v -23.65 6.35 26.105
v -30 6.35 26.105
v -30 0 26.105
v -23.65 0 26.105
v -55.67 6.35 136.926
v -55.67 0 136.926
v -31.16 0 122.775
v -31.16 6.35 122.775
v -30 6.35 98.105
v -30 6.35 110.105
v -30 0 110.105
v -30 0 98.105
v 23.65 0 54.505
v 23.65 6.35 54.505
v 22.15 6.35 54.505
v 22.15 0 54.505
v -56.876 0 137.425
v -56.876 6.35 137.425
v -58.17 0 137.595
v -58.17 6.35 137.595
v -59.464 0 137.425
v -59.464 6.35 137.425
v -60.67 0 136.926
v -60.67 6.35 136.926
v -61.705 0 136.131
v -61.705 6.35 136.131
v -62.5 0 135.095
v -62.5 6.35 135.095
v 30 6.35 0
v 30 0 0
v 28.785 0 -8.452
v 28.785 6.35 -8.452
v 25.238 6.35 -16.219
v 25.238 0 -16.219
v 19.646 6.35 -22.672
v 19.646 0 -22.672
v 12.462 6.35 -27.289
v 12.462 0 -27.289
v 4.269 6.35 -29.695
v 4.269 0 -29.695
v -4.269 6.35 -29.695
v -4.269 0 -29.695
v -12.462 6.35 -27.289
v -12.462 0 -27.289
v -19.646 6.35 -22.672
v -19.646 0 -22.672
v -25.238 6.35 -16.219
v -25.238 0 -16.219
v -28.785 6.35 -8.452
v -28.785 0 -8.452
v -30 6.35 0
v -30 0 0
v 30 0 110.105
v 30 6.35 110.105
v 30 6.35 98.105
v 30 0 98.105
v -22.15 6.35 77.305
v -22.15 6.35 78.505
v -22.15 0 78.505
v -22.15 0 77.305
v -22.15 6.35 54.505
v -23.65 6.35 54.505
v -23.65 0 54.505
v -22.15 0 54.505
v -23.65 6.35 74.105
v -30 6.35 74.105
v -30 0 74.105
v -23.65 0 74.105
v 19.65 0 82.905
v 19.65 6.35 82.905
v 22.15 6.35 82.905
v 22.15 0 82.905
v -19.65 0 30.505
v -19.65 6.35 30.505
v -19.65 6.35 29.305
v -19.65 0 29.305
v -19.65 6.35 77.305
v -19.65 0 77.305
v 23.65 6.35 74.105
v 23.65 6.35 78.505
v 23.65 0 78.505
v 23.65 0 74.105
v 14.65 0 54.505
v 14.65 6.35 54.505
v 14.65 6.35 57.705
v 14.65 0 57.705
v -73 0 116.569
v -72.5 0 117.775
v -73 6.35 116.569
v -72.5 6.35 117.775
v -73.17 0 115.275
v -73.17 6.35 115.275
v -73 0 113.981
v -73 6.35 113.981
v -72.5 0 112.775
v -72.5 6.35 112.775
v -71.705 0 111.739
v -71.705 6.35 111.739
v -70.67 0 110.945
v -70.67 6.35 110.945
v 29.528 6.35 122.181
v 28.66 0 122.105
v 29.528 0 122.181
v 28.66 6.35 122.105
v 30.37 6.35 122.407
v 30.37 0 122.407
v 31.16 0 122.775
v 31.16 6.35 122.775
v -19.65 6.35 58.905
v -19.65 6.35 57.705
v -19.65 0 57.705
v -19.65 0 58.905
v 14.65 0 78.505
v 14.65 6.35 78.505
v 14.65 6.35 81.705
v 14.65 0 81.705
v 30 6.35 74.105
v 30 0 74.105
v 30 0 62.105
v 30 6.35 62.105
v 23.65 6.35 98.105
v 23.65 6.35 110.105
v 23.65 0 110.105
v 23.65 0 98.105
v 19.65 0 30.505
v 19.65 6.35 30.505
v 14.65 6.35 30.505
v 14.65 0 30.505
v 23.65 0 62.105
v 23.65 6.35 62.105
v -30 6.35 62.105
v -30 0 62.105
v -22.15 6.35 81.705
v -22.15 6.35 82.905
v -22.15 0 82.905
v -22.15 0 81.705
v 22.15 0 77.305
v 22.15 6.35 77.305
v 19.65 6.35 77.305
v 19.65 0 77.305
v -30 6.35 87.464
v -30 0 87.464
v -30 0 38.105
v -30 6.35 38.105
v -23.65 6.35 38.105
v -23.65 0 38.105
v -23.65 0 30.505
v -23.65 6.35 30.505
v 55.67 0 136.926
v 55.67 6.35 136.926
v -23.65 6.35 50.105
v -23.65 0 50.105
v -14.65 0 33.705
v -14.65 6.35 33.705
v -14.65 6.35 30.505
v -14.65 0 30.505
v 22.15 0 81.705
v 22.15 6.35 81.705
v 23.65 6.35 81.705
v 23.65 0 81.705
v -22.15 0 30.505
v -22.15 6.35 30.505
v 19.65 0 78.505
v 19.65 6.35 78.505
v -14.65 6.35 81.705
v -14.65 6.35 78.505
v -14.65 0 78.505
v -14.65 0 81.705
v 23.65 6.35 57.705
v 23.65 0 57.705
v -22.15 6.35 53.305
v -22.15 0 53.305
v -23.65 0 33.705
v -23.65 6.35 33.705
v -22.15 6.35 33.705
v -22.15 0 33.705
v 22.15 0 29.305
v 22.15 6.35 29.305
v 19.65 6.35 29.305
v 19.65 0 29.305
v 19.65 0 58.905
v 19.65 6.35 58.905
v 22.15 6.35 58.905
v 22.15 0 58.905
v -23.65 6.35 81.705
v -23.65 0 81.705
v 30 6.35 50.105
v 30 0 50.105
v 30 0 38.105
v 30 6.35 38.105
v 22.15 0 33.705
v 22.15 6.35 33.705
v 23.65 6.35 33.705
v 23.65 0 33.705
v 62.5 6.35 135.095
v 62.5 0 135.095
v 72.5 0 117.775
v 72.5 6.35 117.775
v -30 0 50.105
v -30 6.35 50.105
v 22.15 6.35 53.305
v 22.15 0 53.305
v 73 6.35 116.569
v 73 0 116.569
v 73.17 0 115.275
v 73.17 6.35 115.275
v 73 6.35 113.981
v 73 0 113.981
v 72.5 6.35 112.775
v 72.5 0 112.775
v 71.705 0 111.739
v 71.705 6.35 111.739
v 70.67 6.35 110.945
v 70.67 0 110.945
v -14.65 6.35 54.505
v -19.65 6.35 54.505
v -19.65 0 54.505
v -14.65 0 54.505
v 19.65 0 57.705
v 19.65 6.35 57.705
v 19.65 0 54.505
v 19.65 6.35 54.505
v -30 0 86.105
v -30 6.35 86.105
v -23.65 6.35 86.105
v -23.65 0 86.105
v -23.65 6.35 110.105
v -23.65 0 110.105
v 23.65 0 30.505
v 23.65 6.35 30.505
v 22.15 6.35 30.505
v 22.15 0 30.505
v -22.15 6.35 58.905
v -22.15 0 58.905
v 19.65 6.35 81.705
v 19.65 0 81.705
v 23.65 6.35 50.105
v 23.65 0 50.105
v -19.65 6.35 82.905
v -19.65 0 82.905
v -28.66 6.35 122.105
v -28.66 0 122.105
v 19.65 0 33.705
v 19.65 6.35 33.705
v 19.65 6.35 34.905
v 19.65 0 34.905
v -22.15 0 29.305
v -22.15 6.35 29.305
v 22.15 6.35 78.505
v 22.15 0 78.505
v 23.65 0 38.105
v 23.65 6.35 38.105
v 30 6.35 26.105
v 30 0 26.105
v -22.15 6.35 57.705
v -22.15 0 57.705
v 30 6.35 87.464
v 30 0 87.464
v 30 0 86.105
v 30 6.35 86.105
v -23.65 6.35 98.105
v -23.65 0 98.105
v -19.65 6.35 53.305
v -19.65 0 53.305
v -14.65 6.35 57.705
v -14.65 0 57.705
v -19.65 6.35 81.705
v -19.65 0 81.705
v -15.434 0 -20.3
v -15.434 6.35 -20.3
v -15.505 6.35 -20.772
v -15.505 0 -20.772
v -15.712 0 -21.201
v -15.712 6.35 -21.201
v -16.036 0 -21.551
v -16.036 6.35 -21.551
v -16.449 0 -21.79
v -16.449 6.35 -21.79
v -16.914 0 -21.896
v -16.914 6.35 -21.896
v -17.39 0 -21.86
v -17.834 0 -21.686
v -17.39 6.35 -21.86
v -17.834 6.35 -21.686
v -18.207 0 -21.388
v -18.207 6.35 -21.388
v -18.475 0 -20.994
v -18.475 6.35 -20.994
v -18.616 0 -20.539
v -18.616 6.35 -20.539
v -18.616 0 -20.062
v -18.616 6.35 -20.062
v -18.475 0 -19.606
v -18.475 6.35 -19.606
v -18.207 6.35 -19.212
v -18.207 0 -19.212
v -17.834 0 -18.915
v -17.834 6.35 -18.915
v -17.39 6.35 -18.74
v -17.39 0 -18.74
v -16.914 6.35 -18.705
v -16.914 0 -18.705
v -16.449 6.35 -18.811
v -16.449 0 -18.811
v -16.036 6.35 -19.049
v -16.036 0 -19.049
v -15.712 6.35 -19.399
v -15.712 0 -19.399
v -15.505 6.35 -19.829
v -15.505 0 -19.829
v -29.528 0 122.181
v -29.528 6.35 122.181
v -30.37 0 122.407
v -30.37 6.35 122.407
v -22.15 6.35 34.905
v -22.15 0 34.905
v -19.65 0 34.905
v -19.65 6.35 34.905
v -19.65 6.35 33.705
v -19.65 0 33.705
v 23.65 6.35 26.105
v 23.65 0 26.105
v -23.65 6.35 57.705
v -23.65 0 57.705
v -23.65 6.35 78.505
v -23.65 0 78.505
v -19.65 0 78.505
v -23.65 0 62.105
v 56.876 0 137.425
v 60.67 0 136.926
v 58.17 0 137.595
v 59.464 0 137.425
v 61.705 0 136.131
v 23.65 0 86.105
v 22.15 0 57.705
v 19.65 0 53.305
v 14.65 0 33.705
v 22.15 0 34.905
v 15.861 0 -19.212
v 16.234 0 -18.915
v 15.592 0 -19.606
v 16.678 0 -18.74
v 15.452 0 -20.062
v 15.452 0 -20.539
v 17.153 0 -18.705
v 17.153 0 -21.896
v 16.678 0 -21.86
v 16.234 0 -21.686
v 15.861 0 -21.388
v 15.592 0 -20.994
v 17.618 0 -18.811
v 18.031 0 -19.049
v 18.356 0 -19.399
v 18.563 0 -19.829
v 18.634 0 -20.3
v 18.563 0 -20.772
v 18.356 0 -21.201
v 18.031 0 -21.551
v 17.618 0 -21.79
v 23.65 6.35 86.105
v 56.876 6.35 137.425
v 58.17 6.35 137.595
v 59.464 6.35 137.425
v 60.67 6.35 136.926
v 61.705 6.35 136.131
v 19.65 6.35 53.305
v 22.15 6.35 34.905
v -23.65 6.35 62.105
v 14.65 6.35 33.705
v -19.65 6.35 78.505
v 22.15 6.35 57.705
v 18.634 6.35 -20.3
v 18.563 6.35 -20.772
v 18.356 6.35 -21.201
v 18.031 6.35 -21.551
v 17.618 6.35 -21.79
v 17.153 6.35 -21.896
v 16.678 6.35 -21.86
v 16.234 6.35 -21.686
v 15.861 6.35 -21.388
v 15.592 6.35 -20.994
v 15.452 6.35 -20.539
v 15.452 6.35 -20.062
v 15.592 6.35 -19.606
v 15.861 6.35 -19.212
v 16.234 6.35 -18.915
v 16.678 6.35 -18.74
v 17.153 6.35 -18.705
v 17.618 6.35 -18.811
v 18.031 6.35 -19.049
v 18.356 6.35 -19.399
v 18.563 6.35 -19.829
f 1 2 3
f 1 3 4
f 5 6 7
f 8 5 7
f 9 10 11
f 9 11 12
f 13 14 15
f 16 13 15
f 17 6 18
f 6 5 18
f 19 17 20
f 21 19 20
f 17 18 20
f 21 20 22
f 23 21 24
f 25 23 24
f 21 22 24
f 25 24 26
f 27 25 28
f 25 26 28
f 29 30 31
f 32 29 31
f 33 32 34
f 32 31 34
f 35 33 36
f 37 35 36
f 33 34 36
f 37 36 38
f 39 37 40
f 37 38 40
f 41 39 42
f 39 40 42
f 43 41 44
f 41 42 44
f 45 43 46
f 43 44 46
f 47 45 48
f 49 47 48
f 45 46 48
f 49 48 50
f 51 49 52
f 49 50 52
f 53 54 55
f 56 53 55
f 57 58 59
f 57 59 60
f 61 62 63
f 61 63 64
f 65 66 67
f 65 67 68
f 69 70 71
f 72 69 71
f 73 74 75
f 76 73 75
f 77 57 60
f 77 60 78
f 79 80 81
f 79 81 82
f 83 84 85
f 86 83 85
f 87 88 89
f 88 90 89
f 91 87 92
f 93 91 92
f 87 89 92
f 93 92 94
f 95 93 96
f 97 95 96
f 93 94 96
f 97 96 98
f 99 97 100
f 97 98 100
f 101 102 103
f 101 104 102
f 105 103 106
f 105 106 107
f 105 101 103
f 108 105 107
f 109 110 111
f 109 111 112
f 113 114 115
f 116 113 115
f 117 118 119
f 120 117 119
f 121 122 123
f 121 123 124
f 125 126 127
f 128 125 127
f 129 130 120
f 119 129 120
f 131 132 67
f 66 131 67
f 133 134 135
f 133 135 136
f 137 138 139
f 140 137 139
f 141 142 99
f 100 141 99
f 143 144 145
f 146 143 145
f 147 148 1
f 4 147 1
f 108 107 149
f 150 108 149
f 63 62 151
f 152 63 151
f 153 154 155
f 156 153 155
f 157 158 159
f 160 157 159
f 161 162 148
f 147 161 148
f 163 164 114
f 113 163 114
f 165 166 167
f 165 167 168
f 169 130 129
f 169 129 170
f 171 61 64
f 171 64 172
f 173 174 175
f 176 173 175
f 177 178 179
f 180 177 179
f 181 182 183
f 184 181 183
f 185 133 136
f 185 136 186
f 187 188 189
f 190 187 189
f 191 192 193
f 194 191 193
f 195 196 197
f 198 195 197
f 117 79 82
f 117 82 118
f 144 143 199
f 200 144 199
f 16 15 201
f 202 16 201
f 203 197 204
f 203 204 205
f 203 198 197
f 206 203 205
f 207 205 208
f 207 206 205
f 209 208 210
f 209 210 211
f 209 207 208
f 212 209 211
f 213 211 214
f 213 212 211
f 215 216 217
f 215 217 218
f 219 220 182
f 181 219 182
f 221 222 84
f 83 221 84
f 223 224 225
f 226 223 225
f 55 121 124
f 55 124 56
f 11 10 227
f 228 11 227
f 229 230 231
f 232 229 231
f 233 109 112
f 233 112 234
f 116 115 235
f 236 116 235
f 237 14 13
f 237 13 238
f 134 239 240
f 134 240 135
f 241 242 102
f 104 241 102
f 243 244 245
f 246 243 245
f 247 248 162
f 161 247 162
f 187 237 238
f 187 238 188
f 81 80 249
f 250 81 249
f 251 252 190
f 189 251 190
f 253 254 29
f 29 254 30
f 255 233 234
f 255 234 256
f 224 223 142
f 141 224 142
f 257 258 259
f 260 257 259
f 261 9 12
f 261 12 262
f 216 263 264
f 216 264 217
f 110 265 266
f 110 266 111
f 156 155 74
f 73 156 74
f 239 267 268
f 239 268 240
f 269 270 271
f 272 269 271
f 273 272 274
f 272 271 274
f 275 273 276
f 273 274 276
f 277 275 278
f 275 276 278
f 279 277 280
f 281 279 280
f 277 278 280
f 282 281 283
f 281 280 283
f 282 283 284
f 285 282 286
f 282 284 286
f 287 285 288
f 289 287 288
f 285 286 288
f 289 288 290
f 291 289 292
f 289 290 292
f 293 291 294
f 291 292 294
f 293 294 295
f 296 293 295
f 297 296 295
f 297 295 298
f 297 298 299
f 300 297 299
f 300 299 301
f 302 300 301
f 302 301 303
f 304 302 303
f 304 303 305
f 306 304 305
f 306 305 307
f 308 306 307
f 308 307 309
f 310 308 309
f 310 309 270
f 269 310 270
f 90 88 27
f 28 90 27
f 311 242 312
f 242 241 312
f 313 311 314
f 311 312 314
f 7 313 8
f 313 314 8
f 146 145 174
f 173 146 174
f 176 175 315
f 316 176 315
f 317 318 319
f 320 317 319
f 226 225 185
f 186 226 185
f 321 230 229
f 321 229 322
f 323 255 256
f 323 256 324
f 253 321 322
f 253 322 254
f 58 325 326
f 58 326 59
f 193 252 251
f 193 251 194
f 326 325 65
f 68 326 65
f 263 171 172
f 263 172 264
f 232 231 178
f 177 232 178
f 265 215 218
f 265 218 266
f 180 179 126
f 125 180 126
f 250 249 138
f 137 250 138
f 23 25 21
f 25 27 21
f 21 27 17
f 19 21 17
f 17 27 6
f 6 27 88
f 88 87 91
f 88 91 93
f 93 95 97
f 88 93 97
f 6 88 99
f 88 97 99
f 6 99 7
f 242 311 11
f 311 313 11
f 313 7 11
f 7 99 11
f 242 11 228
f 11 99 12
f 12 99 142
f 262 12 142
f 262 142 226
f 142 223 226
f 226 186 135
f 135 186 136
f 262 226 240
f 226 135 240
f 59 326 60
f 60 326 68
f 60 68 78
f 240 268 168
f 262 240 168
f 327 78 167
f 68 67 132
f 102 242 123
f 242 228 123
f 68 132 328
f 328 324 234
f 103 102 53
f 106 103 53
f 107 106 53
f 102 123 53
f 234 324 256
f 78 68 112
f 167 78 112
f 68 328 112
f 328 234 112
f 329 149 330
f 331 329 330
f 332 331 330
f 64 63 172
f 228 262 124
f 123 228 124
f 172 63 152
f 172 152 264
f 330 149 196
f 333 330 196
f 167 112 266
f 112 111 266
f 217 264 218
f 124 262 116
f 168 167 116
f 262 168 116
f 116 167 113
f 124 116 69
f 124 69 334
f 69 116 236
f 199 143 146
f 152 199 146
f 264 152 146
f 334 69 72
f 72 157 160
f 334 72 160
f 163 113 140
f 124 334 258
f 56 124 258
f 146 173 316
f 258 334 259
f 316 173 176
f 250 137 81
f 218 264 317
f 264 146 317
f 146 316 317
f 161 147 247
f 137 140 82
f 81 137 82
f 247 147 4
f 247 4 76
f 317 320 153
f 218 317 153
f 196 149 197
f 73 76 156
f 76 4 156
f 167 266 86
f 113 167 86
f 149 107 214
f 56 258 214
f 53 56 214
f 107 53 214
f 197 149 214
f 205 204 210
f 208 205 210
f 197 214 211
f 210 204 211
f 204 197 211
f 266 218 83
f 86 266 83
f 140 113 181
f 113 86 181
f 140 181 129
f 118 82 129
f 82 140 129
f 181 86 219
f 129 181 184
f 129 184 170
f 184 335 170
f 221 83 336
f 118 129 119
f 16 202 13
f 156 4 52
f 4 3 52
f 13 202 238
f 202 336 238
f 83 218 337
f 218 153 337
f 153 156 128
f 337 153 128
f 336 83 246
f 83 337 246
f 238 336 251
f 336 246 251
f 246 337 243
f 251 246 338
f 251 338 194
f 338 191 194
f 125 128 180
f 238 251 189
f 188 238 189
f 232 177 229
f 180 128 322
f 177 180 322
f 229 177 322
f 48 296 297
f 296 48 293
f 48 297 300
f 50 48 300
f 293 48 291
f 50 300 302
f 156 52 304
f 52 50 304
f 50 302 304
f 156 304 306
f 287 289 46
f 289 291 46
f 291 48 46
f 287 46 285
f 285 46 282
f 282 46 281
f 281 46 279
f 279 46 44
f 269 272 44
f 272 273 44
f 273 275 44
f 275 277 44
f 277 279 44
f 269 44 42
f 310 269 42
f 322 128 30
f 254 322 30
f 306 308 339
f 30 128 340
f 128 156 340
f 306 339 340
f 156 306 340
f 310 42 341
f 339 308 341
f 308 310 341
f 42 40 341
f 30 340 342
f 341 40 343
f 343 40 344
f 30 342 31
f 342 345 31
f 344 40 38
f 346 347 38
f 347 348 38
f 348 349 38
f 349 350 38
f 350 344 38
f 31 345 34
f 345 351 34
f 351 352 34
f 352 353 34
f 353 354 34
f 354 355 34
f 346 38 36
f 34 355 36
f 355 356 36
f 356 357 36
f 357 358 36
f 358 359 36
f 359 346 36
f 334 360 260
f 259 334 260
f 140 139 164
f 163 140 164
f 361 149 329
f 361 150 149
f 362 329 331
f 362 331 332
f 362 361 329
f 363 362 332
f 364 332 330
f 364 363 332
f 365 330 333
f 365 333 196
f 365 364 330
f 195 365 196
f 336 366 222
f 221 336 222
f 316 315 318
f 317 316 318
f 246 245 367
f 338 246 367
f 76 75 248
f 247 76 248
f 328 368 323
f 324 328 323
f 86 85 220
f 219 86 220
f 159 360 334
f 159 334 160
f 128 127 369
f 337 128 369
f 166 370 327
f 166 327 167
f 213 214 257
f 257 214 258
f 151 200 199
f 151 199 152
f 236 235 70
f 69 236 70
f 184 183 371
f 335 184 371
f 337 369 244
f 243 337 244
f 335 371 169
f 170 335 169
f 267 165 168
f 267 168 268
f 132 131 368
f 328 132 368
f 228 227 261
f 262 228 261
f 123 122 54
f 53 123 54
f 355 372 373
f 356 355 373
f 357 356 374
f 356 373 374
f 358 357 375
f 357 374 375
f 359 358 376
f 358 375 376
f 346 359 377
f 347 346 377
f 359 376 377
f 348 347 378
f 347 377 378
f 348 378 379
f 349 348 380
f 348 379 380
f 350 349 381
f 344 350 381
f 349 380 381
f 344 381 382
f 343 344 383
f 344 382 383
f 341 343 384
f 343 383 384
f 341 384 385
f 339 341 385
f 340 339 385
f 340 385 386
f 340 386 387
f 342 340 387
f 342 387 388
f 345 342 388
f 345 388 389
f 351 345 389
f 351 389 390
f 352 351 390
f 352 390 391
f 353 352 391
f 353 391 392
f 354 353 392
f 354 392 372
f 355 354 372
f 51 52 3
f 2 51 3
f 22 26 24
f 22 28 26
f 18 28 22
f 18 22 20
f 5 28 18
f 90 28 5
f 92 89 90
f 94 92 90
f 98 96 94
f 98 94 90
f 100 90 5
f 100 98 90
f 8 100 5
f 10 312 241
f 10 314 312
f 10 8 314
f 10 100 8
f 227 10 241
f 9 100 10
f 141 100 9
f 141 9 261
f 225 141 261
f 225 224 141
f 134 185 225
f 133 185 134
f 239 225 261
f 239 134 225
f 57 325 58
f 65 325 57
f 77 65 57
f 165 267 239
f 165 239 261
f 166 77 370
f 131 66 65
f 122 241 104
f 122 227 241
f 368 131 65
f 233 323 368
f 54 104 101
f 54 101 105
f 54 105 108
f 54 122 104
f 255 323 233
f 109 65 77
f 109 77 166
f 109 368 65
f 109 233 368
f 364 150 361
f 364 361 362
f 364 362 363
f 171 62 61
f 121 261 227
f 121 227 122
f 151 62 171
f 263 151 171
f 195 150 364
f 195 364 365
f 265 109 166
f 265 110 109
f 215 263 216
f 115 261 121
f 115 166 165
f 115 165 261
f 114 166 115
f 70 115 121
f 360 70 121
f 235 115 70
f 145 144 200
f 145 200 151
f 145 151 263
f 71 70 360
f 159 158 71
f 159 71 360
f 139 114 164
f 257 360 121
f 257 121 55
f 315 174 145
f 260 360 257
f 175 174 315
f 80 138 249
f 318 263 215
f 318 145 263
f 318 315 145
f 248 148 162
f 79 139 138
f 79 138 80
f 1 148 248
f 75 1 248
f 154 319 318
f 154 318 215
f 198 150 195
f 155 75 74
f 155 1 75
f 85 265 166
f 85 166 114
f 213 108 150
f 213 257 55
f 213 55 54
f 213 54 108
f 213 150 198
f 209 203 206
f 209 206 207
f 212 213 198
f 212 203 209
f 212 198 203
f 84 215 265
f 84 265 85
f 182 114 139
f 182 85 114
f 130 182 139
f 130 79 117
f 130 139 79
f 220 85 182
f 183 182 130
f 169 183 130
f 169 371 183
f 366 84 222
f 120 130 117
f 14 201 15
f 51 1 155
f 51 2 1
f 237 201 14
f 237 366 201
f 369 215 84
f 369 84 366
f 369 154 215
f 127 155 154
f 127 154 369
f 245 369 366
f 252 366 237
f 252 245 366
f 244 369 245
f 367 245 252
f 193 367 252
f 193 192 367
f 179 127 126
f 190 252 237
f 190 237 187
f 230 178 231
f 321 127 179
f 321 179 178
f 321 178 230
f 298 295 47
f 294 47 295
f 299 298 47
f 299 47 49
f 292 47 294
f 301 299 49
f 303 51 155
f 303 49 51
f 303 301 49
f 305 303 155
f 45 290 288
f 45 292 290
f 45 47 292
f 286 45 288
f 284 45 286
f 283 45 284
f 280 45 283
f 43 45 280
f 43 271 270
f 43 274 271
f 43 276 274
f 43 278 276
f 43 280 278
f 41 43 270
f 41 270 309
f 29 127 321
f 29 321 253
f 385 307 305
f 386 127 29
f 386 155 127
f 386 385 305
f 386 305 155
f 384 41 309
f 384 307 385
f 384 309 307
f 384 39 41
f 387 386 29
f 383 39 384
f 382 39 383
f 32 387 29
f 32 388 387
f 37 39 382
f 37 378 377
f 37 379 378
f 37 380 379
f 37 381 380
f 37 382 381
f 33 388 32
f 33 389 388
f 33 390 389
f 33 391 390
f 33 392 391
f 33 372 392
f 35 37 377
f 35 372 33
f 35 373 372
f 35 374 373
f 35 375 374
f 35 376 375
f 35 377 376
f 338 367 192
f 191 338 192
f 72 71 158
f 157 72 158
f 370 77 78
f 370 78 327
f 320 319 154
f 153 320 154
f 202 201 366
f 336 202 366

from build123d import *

# Parameters (mm, degrees)
BOSS_EXTRUDE1_DEPTH = 6.35
CUT_EXTRUDE1_REACH  = 8.35
SKETCH3_W           = 6.35
SKETCH3_H           = 12
CUT_EXTRUDE2_REACH  = 8.35
SKETCH5_R           = 1.6
CUT_EXTRUDE3_DEPTH  = 7.35
FILLET1_R           = 5


with BuildPart() as part:
    # Sketch1 → Boss-Extrude1 (new body)
    with BuildSketch(Plane(origin=(0, 0, 0), x_dir=(1, 0, 0), z_dir=(0, 1, 0))):
        with BuildLine():
            Line((-30, -122.105), (30, -122.105))
            Line((30, -122.105), (60, -139.425508076))
            Line((60, -139.425508076), (75, -113.444745962))
            Line((75, -113.444745962), (30, -87.463983849))
            Line((30, -87.463983849), (30, 0))
            ThreePointArc((30, 0), (0, 30), (-30, 0))
            Line((-30, 0), (-30, -87.463983849))
            Line((-30, -87.463983849), (-75, -113.444745962))
            Line((-75, -113.444745962), (-60, -139.425508076))
            Line((-60, -139.425508076), (-30, -122.105))
        make_face()
    extrude(amount=BOSS_EXTRUDE1_DEPTH)

    # Sketch3 → Cut-Extrude1 (cut, up to next)
    with BuildSketch(Plane(origin=(0, 6.35, 0), x_dir=(1, 0, 0), z_dir=(0, 1, 0)), mode=Mode.PRIVATE) as cut_extrude1_sk1:
        with Locations((-26.825, -104.105)):
            Rectangle(SKETCH3_W, SKETCH3_H)
    cut_extrude1_tool1 = extrude(cut_extrude1_sk1.sketch, amount=-CUT_EXTRUDE1_REACH, mode=Mode.PRIVATE) & part.part
    add(cut_extrude1_tool1.solids().sort_by_distance((-26.825, 6.35, 104.105))[0], mode=Mode.SUBTRACT)
    # Sketch3 → Cut-Extrude1 (cut, up to next)
    with BuildSketch(Plane(origin=(0, 6.35, 0), x_dir=(1, 0, 0), z_dir=(0, 1, 0)), mode=Mode.PRIVATE) as cut_extrude1_sk2:
        with Locations((-26.825, -80.105)):
            Rectangle(SKETCH3_W, SKETCH3_H)
    cut_extrude1_tool2 = extrude(cut_extrude1_sk2.sketch, amount=-CUT_EXTRUDE1_REACH, mode=Mode.PRIVATE) & part.part
    add(cut_extrude1_tool2.solids().sort_by_distance((-26.825, 6.35, 80.105))[0], mode=Mode.SUBTRACT)
    # Sketch3 → Cut-Extrude1 (cut, up to next)
    with BuildSketch(Plane(origin=(0, 6.35, 0), x_dir=(1, 0, 0), z_dir=(0, 1, 0)), mode=Mode.PRIVATE) as cut_extrude1_sk3:
        with Locations((-26.825, -56.105)):
            Rectangle(SKETCH3_W, SKETCH3_H)
    cut_extrude1_tool3 = extrude(cut_extrude1_sk3.sketch, amount=-CUT_EXTRUDE1_REACH, mode=Mode.PRIVATE) & part.part
    add(cut_extrude1_tool3.solids().sort_by_distance((-26.825, 6.35, 56.105))[0], mode=Mode.SUBTRACT)
    # Sketch3 → Cut-Extrude1 (cut, up to next)
    with BuildSketch(Plane(origin=(0, 6.35, 0), x_dir=(1, 0, 0), z_dir=(0, 1, 0)), mode=Mode.PRIVATE) as cut_extrude1_sk4:
        with Locations((-26.825, -32.105)):
            Rectangle(SKETCH3_W, SKETCH3_H)
    cut_extrude1_tool4 = extrude(cut_extrude1_sk4.sketch, amount=-CUT_EXTRUDE1_REACH, mode=Mode.PRIVATE) & part.part
    add(cut_extrude1_tool4.solids().sort_by_distance((-26.825, 6.35, 32.105))[0], mode=Mode.SUBTRACT)
    # Sketch3 → Cut-Extrude1 (cut, up to next)
    with BuildSketch(Plane(origin=(0, 6.35, 0), x_dir=(1, 0, 0), z_dir=(0, 1, 0)), mode=Mode.PRIVATE) as cut_extrude1_sk5:
        with Locations((26.825, -32.105)):
            Rectangle(SKETCH3_W, SKETCH3_H)
    cut_extrude1_tool5 = extrude(cut_extrude1_sk5.sketch, amount=-CUT_EXTRUDE1_REACH, mode=Mode.PRIVATE) & part.part
    add(cut_extrude1_tool5.solids().sort_by_distance((26.825, 6.35, 32.105))[0], mode=Mode.SUBTRACT)
    # Sketch3 → Cut-Extrude1 (cut, up to next)
    with BuildSketch(Plane(origin=(0, 6.35, 0), x_dir=(1, 0, 0), z_dir=(0, 1, 0)), mode=Mode.PRIVATE) as cut_extrude1_sk6:
        with Locations((26.825, -56.105)):
            Rectangle(SKETCH3_W, SKETCH3_H)
    cut_extrude1_tool6 = extrude(cut_extrude1_sk6.sketch, amount=-CUT_EXTRUDE1_REACH, mode=Mode.PRIVATE) & part.part
    add(cut_extrude1_tool6.solids().sort_by_distance((26.825, 6.35, 56.105))[0], mode=Mode.SUBTRACT)
    # Sketch3 → Cut-Extrude1 (cut, up to next)
    with BuildSketch(Plane(origin=(0, 6.35, 0), x_dir=(1, 0, 0), z_dir=(0, 1, 0)), mode=Mode.PRIVATE) as cut_extrude1_sk7:
        with Locations((26.825, -80.105)):
            Rectangle(SKETCH3_W, SKETCH3_H)
    cut_extrude1_tool7 = extrude(cut_extrude1_sk7.sketch, amount=-CUT_EXTRUDE1_REACH, mode=Mode.PRIVATE) & part.part
    add(cut_extrude1_tool7.solids().sort_by_distance((26.825, 6.35, 80.105))[0], mode=Mode.SUBTRACT)
    # Sketch3 → Cut-Extrude1 (cut, up to next)
    with BuildSketch(Plane(origin=(0, 6.35, 0), x_dir=(1, 0, 0), z_dir=(0, 1, 0)), mode=Mode.PRIVATE) as cut_extrude1_sk8:
        with Locations((26.825, -104.105)):
            Rectangle(SKETCH3_W, SKETCH3_H)
    cut_extrude1_tool8 = extrude(cut_extrude1_sk8.sketch, amount=-CUT_EXTRUDE1_REACH, mode=Mode.PRIVATE) & part.part
    add(cut_extrude1_tool8.solids().sort_by_distance((26.825, 6.35, 104.105))[0], mode=Mode.SUBTRACT)

    # Sketch4 → Cut-Extrude2 (cut, up to next)
    with BuildSketch(Plane(origin=(0, 6.35, 0), x_dir=(1, 0, 0), z_dir=(0, 1, 0)), mode=Mode.PRIVATE) as cut_extrude2_sk1:
        Polygon((23.65, -30.505), (22.15, -30.505), (22.15, -29.305), (19.65, -29.305), (19.65, -30.505), (14.65, -30.505), (14.65, -33.705), (19.65, -33.705), (19.65, -34.905), (22.15, -34.905), (22.15, -33.705), (23.65, -33.705), align=None)
    cut_extrude2_tool1 = extrude(cut_extrude2_sk1.sketch, amount=-CUT_EXTRUDE2_REACH, mode=Mode.PRIVATE) & part.part
    add(cut_extrude2_tool1.solids().sort_by_distance((19.451724, 6.35, 32.105))[0], mode=Mode.SUBTRACT)
    # Sketch4 → Cut-Extrude2 (cut, up to next)
    with BuildSketch(Plane(origin=(0, 6.35, 0), x_dir=(1, 0, 0), z_dir=(0, 1, 0)), mode=Mode.PRIVATE) as cut_extrude2_sk2:
        Polygon((22.15, -53.305), (19.65, -53.305), (19.65, -54.505), (14.65, -54.505), (14.65, -57.705), (19.65, -57.705), (19.65, -58.905), (22.15, -58.905), (22.15, -57.705), (23.65, -57.705), (23.65, -54.505), (22.15, -54.505), align=None)
    cut_extrude2_tool2 = extrude(cut_extrude2_sk2.sketch, amount=-CUT_EXTRUDE2_REACH, mode=Mode.PRIVATE) & part.part
    add(cut_extrude2_tool2.solids().sort_by_distance((19.451724, 6.35, 56.105))[0], mode=Mode.SUBTRACT)
    # Sketch4 → Cut-Extrude2 (cut, up to next)
    with BuildSketch(Plane(origin=(0, 6.35, 0), x_dir=(1, 0, 0), z_dir=(0, 1, 0)), mode=Mode.PRIVATE) as cut_extrude2_sk3:
        Polygon((22.15, -77.305), (19.65, -77.305), (19.65, -78.505), (14.65, -78.505), (14.65, -81.705), (19.65, -81.705), (19.65, -82.905), (22.15, -82.905), (22.15, -81.705), (23.65, -81.705), (23.65, -78.505), (22.15, -78.505), align=None)
    cut_extrude2_tool3 = extrude(cut_extrude2_sk3.sketch, amount=-CUT_EXTRUDE2_REACH, mode=Mode.PRIVATE) & part.part
    add(cut_extrude2_tool3.solids().sort_by_distance((19.451724, 6.35, 80.105))[0], mode=Mode.SUBTRACT)
    # Sketch4 → Cut-Extrude2 (cut, up to next)
    with BuildSketch(Plane(origin=(0, 6.35, 0), x_dir=(1, 0, 0), z_dir=(0, 1, 0)), mode=Mode.PRIVATE) as cut_extrude2_sk4:
        Polygon((-22.15, -78.505), (-22.15, -77.305), (-19.65, -77.305), (-19.65, -78.505), (-14.65, -78.505), (-14.65, -81.705), (-19.65, -81.705), (-19.65, -82.905), (-22.15, -82.905), (-22.15, -81.705), (-23.65, -81.705), (-23.65, -78.505), align=None)
    cut_extrude2_tool4 = extrude(cut_extrude2_sk4.sketch, amount=-CUT_EXTRUDE2_REACH, mode=Mode.PRIVATE) & part.part
    add(cut_extrude2_tool4.solids().sort_by_distance((-19.451724, 6.35, 80.105))[0], mode=Mode.SUBTRACT)
    # Sketch4 → Cut-Extrude2 (cut, up to next)
    with BuildSketch(Plane(origin=(0, 6.35, 0), x_dir=(1, 0, 0), z_dir=(0, 1, 0)), mode=Mode.PRIVATE) as cut_extrude2_sk5:
        Polygon((-22.15, -54.505), (-22.15, -53.305), (-19.65, -53.305), (-19.65, -54.505), (-14.65, -54.505), (-14.65, -57.705), (-19.65, -57.705), (-19.65, -58.905), (-22.15, -58.905), (-22.15, -57.705), (-23.65, -57.705), (-23.65, -54.505), align=None)
    cut_extrude2_tool5 = extrude(cut_extrude2_sk5.sketch, amount=-CUT_EXTRUDE2_REACH, mode=Mode.PRIVATE) & part.part
    add(cut_extrude2_tool5.solids().sort_by_distance((-19.451724, 6.35, 56.105))[0], mode=Mode.SUBTRACT)
    # Sketch4 → Cut-Extrude2 (cut, up to next)
    with BuildSketch(Plane(origin=(0, 6.35, 0), x_dir=(1, 0, 0), z_dir=(0, 1, 0)), mode=Mode.PRIVATE) as cut_extrude2_sk6:
        Polygon((-19.65, -33.705), (-14.65, -33.705), (-14.65, -30.505), (-19.65, -30.505), (-19.65, -29.305), (-22.15, -29.305), (-22.15, -30.505), (-23.65, -30.505), (-23.65, -33.705), (-22.15, -33.705), (-22.15, -34.905), (-19.65, -34.905), align=None)
    cut_extrude2_tool6 = extrude(cut_extrude2_sk6.sketch, amount=-CUT_EXTRUDE2_REACH, mode=Mode.PRIVATE) & part.part
    add(cut_extrude2_tool6.solids().sort_by_distance((-19.451724, 6.35, 32.105))[0], mode=Mode.SUBTRACT)

    # Sketch5 → Cut-Extrude3 (cut, through all)
    with BuildSketch(Plane(origin=(0, 6.35, 0), x_dir=(1, 0, 0), z_dir=(0, 1, 0))):
        with Locations((-17.033871657, 20.300177743)):
            Circle(SKETCH5_R)
        with Locations((17.033871657, 20.300177743)):
            Circle(SKETCH5_R)
    extrude(amount=-CUT_EXTRUDE3_DEPTH, mode=Mode.SUBTRACT)

    # Fillet1
    fillet1_edges = [part.edges().sort_by_distance(p)[0] for p in [
        (75, 3.175, 113.444745962),
        (60, 3.175, 139.425508076),
        (30, 3.175, 122.105),
        (-30, 3.175, 122.105),
        (-60, 3.175, 139.425508076),
        (-75, 3.175, 113.444745962),
    ]]
    fillet(fillet1_edges, radius=FILLET1_R)


solid = part.part
